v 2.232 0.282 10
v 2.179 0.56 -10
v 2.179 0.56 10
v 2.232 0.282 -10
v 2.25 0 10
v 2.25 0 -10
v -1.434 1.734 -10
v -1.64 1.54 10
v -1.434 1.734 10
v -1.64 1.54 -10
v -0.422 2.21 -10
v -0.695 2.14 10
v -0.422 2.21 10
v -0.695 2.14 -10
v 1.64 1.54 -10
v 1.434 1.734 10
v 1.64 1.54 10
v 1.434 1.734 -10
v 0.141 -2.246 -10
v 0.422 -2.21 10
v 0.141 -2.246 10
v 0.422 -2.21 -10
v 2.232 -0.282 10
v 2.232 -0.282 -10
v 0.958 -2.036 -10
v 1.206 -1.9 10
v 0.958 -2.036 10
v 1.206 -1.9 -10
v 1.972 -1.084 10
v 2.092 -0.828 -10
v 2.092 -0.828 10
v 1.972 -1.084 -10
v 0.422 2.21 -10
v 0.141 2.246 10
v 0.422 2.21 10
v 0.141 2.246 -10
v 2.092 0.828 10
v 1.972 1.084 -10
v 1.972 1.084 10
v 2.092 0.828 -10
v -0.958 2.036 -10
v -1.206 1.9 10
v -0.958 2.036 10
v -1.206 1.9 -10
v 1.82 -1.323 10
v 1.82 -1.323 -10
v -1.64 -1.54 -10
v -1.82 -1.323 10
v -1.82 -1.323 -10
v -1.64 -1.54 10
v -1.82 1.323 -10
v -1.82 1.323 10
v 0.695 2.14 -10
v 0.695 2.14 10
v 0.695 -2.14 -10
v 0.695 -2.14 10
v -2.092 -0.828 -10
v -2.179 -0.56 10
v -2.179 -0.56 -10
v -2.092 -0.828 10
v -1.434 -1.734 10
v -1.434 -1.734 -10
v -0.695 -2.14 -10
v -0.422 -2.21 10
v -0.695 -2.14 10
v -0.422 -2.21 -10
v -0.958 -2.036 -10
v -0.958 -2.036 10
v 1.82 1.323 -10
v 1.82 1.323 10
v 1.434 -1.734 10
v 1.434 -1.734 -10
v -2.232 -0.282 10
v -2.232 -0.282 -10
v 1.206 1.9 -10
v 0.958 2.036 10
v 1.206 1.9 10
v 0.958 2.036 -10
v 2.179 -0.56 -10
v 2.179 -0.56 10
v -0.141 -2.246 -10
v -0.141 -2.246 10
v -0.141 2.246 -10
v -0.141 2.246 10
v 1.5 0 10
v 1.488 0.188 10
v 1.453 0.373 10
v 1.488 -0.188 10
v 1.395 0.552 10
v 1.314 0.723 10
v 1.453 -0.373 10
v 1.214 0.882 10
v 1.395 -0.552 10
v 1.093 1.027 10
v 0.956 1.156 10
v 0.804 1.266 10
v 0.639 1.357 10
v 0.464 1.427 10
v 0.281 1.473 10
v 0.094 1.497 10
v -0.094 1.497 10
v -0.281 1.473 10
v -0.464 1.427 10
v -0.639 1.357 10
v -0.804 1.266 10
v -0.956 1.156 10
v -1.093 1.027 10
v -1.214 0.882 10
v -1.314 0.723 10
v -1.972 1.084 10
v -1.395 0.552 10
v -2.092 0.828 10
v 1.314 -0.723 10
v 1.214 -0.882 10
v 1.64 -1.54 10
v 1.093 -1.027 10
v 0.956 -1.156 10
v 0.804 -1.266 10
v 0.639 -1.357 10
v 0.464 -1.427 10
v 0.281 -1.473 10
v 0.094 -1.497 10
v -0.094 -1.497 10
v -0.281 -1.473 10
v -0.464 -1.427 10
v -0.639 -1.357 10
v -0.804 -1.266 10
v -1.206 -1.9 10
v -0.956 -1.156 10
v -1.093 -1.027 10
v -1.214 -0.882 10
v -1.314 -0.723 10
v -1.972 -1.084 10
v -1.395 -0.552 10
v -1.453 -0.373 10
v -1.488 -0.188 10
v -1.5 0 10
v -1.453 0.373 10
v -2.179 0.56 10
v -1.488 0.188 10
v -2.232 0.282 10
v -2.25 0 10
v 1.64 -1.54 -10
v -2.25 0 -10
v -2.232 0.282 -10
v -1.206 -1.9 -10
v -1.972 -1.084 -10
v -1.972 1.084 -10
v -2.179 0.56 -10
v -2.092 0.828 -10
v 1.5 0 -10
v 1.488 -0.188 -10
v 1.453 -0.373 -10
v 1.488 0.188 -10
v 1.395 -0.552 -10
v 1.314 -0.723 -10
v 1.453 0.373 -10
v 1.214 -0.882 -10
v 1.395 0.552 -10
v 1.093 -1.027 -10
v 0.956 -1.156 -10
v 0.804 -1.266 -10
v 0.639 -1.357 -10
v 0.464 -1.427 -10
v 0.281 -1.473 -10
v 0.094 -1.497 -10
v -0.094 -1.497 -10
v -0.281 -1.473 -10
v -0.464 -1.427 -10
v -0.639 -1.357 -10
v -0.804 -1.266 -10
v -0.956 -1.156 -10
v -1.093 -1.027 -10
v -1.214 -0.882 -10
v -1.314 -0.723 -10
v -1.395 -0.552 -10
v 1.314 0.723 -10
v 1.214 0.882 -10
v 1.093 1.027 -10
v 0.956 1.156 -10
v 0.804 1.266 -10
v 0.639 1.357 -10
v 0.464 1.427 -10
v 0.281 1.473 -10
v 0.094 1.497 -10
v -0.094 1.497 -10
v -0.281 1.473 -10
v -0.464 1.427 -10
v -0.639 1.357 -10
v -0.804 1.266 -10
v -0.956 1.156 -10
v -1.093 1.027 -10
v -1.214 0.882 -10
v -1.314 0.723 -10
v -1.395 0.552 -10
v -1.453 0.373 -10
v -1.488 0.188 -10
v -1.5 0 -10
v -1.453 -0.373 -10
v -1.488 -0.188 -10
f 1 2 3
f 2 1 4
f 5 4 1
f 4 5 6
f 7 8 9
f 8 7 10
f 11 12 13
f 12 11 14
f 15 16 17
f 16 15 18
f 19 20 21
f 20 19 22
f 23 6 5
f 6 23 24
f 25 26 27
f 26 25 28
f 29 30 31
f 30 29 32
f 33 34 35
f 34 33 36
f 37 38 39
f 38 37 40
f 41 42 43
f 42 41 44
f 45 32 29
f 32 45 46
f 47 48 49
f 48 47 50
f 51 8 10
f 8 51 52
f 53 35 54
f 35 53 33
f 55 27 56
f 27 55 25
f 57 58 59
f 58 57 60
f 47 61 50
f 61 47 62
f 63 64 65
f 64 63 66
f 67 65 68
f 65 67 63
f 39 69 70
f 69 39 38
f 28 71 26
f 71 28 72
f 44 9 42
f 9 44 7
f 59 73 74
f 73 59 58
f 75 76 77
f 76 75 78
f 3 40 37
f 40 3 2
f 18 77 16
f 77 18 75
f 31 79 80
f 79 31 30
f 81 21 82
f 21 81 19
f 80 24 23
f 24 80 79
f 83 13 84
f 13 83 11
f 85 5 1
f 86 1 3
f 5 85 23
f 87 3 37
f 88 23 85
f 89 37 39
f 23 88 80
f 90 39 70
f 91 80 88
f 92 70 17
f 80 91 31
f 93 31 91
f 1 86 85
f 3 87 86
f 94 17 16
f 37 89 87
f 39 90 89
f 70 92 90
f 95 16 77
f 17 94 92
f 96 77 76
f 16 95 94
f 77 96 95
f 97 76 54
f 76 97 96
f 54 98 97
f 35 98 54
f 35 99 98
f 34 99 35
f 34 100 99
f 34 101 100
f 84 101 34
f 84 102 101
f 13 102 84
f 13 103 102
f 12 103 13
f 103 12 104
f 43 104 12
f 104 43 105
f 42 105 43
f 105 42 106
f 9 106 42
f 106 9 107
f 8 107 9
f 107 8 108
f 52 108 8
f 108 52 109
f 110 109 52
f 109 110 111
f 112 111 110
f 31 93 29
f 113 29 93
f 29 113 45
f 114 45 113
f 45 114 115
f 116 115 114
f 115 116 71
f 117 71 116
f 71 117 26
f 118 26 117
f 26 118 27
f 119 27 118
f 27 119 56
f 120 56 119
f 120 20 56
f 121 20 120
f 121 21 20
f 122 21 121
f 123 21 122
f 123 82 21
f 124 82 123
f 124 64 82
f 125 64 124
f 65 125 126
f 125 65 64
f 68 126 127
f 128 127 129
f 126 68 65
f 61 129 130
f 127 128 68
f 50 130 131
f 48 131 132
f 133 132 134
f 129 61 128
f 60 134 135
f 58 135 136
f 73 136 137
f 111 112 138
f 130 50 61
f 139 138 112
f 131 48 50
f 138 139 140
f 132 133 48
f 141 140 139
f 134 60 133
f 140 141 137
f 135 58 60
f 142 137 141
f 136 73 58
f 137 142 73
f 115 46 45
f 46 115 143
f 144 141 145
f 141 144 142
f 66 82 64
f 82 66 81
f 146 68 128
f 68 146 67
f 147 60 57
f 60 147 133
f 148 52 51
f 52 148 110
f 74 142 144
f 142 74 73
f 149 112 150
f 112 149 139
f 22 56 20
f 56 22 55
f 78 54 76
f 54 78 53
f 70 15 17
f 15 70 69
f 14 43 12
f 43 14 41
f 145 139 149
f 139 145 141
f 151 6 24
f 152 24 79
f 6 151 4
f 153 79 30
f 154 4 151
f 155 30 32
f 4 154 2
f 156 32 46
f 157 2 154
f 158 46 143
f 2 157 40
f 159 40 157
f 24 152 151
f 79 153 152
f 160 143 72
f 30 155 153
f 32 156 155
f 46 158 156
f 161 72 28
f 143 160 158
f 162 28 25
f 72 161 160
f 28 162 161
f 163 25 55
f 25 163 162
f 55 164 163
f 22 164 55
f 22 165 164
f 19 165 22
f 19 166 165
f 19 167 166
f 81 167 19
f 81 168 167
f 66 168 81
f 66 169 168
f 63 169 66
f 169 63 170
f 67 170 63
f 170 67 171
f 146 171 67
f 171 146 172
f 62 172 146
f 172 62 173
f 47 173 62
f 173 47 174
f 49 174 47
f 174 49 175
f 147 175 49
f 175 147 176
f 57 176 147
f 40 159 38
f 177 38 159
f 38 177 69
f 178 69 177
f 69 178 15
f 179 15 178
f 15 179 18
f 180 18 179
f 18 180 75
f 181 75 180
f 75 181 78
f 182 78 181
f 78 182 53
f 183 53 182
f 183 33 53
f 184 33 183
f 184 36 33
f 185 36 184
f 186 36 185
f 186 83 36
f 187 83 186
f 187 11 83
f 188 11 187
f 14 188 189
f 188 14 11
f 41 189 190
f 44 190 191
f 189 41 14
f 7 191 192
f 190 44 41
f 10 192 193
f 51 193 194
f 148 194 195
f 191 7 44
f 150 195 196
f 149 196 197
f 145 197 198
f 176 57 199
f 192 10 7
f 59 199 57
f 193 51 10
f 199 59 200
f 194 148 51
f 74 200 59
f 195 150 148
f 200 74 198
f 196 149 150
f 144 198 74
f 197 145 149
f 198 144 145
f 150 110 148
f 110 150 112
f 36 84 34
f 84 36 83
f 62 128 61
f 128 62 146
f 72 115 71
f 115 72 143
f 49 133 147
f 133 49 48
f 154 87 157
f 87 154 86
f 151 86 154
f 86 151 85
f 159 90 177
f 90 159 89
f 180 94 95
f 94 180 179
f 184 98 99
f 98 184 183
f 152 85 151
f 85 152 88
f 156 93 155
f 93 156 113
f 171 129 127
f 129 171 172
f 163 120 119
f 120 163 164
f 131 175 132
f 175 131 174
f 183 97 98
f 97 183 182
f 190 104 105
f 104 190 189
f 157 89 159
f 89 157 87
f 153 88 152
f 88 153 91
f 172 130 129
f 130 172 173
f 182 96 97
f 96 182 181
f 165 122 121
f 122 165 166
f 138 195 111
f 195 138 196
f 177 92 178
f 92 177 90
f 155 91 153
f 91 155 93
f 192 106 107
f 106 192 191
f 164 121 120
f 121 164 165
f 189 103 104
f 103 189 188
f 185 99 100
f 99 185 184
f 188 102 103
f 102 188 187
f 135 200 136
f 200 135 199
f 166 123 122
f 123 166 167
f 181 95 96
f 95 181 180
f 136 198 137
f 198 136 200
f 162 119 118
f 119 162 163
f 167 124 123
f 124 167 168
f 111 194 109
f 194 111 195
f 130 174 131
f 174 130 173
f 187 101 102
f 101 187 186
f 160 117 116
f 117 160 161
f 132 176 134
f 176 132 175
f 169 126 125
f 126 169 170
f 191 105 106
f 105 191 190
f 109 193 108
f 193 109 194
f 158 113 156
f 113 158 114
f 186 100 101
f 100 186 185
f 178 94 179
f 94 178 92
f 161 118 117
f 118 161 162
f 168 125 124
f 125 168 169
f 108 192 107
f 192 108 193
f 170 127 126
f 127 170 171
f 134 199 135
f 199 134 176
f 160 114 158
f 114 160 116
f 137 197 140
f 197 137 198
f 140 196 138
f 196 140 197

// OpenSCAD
$fn = 50;


difference() {
	union() {
		translate(v = [0, 0, -10.0000000000]) {
			cylinder(h = 20, r = 2.2500000000);
		}
	}
	union() {
		translate(v = [0, 0, -100.0000000000]) {
			cylinder(h = 200, r = 1.5000000000);
		}
	}
}
